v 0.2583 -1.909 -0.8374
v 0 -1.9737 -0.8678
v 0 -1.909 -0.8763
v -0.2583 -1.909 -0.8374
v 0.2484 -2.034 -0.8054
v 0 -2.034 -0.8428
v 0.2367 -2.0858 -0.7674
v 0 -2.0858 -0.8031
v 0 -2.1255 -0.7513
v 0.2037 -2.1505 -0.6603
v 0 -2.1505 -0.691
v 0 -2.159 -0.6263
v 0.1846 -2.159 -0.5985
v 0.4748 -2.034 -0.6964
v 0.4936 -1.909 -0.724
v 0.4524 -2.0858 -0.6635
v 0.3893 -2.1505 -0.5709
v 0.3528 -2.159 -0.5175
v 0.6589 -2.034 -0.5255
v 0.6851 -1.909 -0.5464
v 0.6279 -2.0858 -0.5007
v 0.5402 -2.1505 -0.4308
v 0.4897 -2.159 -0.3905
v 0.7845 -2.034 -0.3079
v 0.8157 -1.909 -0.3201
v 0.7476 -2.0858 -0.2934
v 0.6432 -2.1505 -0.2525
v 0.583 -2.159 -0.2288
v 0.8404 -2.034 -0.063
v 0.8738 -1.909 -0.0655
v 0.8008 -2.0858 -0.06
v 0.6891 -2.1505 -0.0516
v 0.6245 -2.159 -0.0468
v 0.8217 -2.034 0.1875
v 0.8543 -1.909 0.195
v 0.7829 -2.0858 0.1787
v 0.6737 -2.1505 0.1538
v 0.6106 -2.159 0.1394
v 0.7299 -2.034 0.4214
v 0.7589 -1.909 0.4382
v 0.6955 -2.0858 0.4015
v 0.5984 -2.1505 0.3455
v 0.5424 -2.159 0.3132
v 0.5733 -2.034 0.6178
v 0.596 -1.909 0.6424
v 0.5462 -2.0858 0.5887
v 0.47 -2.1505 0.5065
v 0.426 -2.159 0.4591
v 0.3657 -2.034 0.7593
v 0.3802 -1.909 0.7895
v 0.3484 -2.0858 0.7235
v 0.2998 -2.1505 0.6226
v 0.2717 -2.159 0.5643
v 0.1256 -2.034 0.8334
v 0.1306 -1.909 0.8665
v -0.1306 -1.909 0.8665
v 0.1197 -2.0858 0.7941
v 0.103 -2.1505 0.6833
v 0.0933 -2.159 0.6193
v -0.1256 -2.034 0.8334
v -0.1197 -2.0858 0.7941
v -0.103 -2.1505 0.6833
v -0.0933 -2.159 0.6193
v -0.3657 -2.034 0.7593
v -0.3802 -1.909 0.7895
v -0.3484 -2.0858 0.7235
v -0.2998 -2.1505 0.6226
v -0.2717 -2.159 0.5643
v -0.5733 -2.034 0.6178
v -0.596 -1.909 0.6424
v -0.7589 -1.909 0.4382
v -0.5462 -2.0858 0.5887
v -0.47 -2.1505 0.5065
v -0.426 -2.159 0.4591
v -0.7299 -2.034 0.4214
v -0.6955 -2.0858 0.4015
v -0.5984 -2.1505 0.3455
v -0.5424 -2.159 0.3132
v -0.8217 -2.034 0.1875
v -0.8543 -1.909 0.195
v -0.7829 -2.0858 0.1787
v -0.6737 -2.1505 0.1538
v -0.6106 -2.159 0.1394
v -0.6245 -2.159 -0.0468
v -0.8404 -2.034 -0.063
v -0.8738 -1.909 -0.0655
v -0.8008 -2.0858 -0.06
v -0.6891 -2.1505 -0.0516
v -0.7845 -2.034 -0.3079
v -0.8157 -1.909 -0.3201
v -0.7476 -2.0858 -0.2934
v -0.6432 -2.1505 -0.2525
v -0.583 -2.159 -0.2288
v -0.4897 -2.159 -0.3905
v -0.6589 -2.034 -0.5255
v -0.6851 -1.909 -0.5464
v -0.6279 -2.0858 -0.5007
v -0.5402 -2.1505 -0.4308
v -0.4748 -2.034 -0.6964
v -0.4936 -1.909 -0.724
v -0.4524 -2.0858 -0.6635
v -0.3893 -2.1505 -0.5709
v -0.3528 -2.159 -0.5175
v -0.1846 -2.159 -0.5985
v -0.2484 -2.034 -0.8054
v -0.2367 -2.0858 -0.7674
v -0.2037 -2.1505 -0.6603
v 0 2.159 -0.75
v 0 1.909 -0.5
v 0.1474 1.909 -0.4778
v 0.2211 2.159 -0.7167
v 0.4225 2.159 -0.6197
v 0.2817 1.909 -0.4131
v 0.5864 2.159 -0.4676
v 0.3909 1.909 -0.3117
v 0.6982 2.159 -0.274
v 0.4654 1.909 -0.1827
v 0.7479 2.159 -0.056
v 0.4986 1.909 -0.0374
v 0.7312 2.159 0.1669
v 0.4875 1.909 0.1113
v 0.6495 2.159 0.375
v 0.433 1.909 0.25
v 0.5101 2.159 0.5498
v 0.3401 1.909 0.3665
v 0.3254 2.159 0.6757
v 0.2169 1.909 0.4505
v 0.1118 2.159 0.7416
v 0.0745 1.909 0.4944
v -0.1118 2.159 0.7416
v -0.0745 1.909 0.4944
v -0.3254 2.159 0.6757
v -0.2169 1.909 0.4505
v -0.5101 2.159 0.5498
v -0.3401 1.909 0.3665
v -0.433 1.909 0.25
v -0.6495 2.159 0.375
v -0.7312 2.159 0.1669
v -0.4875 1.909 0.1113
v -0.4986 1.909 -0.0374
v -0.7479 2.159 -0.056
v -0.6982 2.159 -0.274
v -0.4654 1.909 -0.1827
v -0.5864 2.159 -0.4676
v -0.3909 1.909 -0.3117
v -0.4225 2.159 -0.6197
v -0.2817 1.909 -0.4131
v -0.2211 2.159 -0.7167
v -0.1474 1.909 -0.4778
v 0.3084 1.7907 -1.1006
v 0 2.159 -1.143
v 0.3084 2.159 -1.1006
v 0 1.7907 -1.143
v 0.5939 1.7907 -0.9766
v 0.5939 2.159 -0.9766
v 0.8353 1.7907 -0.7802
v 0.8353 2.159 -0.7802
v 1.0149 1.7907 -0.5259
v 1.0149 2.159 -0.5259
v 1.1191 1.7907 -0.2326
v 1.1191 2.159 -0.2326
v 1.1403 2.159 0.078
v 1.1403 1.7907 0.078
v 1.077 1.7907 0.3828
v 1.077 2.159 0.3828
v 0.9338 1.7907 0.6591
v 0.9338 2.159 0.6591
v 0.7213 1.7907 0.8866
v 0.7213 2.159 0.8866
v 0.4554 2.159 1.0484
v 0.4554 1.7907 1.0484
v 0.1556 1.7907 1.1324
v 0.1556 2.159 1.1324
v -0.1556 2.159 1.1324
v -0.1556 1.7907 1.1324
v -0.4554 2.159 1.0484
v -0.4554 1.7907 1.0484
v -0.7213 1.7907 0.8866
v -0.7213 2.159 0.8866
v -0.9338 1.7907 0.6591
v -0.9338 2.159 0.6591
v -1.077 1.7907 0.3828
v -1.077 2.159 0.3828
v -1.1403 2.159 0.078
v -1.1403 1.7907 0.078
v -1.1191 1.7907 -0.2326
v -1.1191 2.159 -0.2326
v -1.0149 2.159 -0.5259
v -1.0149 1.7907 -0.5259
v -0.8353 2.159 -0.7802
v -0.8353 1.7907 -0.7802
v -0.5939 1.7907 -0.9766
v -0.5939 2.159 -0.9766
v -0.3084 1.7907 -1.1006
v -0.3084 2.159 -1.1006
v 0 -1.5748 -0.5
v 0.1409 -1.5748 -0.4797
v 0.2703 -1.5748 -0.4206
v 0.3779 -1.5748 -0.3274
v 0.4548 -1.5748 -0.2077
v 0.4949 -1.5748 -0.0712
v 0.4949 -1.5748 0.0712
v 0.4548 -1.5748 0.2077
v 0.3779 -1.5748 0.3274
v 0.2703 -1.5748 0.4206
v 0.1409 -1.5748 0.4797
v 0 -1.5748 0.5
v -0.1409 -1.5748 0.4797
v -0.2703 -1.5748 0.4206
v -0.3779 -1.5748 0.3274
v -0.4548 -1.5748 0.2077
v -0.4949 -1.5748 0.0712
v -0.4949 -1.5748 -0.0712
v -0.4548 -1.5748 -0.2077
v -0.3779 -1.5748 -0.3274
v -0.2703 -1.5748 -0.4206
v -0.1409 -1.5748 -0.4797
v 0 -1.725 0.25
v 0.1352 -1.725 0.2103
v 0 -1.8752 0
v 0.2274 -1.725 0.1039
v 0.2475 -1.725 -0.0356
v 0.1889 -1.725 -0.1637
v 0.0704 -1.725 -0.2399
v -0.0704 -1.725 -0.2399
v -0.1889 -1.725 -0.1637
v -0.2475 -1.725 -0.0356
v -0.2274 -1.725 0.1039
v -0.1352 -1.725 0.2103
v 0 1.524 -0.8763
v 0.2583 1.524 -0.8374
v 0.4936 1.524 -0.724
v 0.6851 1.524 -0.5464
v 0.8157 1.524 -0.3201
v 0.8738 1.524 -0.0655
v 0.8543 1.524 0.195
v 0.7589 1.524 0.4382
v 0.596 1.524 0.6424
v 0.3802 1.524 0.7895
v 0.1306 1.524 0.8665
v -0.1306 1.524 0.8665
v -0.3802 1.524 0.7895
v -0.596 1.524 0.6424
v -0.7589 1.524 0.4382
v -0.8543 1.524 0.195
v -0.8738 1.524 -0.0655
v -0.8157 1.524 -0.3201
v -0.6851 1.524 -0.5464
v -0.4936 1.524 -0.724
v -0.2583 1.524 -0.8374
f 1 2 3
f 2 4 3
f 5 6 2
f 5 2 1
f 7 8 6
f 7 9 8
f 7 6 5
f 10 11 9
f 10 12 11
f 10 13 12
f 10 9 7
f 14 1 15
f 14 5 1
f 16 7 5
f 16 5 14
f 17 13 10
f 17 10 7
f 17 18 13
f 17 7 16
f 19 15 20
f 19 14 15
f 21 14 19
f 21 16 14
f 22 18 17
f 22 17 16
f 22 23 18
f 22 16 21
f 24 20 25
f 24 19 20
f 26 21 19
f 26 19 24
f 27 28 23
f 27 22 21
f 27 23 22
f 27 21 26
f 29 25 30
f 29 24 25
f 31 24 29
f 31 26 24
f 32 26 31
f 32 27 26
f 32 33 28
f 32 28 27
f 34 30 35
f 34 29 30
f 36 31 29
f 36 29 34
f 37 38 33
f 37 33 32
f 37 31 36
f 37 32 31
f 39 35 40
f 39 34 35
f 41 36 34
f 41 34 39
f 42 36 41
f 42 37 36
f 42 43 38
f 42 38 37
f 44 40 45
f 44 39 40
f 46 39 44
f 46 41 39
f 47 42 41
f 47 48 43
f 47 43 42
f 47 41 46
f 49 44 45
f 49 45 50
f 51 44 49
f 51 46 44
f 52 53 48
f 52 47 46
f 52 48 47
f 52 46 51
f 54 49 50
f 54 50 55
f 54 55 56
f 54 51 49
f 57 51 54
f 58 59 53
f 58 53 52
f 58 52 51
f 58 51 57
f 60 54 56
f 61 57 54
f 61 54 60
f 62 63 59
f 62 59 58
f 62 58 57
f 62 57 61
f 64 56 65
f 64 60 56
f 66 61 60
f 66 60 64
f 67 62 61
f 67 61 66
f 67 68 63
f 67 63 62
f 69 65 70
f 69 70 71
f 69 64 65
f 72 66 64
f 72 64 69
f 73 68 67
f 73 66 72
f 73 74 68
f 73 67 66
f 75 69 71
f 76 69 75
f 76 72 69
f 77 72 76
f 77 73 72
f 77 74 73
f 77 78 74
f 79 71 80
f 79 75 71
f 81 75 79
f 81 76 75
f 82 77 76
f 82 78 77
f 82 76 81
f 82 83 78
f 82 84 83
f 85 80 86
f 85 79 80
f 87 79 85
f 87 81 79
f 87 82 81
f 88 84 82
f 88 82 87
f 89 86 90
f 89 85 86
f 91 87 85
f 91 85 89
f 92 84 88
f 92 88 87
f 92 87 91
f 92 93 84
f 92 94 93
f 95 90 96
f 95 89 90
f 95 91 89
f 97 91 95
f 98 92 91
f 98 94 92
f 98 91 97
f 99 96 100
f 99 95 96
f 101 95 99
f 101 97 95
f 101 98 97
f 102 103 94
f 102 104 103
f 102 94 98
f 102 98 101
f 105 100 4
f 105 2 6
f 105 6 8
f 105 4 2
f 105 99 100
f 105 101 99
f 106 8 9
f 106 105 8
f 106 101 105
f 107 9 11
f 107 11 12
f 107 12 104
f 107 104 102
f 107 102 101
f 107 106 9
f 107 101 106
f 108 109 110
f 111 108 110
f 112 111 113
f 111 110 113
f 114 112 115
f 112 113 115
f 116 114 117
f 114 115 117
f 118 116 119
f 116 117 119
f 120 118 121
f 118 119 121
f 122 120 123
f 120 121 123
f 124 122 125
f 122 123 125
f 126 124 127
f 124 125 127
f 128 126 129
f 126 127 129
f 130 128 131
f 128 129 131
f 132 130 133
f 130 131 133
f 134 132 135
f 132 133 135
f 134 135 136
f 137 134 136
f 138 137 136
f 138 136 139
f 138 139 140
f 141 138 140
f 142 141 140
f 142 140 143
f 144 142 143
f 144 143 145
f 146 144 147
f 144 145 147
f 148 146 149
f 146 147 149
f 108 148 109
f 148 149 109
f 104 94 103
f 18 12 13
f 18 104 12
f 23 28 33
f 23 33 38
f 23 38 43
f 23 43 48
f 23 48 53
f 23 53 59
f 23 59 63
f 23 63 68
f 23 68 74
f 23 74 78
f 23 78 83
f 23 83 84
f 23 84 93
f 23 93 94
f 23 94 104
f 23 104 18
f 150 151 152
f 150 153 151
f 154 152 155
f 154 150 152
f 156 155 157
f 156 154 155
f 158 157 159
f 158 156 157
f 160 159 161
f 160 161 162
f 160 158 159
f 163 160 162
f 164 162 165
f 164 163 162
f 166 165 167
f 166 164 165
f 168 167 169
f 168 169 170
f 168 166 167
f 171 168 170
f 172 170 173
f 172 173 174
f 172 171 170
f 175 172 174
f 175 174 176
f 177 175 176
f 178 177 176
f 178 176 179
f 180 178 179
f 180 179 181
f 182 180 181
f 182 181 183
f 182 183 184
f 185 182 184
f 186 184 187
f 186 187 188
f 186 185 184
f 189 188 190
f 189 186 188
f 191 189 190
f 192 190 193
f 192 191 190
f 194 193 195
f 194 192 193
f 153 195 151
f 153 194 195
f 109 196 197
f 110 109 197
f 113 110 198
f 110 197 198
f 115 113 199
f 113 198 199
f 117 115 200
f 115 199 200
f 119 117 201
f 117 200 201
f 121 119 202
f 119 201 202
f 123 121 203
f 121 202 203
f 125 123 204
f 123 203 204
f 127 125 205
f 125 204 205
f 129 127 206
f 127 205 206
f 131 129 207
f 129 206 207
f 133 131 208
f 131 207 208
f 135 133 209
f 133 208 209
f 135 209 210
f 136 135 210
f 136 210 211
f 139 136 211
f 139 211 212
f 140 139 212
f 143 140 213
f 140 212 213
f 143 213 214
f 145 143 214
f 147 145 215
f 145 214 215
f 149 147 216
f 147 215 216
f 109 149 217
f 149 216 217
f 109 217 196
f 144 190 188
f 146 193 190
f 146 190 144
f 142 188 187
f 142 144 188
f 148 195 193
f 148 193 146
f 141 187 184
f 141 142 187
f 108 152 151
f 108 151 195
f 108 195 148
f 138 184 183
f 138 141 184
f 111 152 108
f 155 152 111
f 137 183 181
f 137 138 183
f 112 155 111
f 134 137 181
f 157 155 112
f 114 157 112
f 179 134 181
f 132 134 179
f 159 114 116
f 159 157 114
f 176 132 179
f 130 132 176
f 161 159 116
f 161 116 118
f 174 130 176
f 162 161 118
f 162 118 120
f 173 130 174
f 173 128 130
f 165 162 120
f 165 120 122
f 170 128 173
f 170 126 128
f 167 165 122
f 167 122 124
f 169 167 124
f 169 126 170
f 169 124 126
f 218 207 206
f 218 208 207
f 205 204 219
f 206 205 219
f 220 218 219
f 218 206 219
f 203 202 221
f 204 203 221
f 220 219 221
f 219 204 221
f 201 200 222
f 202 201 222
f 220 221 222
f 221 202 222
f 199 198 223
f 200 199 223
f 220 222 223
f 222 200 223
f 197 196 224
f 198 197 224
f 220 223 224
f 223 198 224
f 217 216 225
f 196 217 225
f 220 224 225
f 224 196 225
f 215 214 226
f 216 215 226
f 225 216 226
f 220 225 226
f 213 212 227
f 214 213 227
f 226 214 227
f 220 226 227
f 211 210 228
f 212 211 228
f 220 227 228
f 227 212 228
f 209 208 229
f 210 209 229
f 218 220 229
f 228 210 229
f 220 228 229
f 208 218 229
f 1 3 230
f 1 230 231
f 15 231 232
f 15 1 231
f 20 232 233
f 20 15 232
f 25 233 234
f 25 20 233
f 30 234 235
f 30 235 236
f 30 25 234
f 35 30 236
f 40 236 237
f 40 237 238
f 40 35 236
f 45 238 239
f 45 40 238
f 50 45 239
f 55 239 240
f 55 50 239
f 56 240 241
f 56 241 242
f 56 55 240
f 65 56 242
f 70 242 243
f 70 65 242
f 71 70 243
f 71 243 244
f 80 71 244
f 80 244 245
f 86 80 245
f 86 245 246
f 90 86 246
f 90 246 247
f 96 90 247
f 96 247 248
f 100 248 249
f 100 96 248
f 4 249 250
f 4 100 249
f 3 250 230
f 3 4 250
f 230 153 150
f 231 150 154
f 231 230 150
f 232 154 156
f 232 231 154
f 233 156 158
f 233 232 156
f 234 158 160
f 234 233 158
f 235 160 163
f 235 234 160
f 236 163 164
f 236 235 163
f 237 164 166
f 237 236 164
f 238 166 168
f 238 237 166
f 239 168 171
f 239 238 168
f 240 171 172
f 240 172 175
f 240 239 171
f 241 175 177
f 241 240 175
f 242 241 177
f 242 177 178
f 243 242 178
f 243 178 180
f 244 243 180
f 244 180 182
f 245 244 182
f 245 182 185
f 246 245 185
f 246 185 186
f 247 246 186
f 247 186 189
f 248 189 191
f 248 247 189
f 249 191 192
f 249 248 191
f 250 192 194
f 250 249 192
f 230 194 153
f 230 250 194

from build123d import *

# Parameters (mm, degrees)
F_1_0_1_DIAMETER_HOLE1_D     = 1
F_1_0_1_DIAMETER_HOLE1_DEPTH = 3.7338
F_1_0_1_DIAMETER_HOLE1_TIP   = 0.30043031
FILLET1_R                    = 0.25
CHAMFER1_SIZE                = 0.25


with BuildPart() as part:
    # Sketch1 → Revolve1 (revolve)
    with BuildSketch(Plane(origin=(0, 0, 0), x_dir=(0, 0, -1), z_dir=(1, 0, 0))):
        Polygon((0, 2.159), (1.143, 2.159), (1.143, 1.7907), (0.8763, 1.524), (0.8763, -2.159), (0, -2.159), align=None)
    revolve(axis=Axis((0, 2.159, 0), (0, -1, 0)))

    # Ø1.0 (1) Diameter Hole1
    with Locations(Plane.ZX.offset(2.159)):
        with Locations((0, 0)):
            Hole(F_1_0_1_DIAMETER_HOLE1_D / 2, depth=F_1_0_1_DIAMETER_HOLE1_DEPTH)
            with Locations((0, 0, -(F_1_0_1_DIAMETER_HOLE1_DEPTH + F_1_0_1_DIAMETER_HOLE1_TIP / 2))):  # 118° drill point
                Cone(0, F_1_0_1_DIAMETER_HOLE1_D / 2, F_1_0_1_DIAMETER_HOLE1_TIP, mode=Mode.SUBTRACT)

    # Fillet1
    fillet1_edges = [part.edges().sort_by_distance(p)[0] for p in [
        (0, -2.159, 0.8763),
    ]]
    fillet(fillet1_edges, radius=FILLET1_R)

    # Chamfer1
    chamfer1_edges = [part.edges().sort_by_distance(p)[0] for p in [
        (0, 2.159, 0.5),
    ]]
    chamfer(chamfer1_edges, length=CHAMFER1_SIZE)


solid = part.part
